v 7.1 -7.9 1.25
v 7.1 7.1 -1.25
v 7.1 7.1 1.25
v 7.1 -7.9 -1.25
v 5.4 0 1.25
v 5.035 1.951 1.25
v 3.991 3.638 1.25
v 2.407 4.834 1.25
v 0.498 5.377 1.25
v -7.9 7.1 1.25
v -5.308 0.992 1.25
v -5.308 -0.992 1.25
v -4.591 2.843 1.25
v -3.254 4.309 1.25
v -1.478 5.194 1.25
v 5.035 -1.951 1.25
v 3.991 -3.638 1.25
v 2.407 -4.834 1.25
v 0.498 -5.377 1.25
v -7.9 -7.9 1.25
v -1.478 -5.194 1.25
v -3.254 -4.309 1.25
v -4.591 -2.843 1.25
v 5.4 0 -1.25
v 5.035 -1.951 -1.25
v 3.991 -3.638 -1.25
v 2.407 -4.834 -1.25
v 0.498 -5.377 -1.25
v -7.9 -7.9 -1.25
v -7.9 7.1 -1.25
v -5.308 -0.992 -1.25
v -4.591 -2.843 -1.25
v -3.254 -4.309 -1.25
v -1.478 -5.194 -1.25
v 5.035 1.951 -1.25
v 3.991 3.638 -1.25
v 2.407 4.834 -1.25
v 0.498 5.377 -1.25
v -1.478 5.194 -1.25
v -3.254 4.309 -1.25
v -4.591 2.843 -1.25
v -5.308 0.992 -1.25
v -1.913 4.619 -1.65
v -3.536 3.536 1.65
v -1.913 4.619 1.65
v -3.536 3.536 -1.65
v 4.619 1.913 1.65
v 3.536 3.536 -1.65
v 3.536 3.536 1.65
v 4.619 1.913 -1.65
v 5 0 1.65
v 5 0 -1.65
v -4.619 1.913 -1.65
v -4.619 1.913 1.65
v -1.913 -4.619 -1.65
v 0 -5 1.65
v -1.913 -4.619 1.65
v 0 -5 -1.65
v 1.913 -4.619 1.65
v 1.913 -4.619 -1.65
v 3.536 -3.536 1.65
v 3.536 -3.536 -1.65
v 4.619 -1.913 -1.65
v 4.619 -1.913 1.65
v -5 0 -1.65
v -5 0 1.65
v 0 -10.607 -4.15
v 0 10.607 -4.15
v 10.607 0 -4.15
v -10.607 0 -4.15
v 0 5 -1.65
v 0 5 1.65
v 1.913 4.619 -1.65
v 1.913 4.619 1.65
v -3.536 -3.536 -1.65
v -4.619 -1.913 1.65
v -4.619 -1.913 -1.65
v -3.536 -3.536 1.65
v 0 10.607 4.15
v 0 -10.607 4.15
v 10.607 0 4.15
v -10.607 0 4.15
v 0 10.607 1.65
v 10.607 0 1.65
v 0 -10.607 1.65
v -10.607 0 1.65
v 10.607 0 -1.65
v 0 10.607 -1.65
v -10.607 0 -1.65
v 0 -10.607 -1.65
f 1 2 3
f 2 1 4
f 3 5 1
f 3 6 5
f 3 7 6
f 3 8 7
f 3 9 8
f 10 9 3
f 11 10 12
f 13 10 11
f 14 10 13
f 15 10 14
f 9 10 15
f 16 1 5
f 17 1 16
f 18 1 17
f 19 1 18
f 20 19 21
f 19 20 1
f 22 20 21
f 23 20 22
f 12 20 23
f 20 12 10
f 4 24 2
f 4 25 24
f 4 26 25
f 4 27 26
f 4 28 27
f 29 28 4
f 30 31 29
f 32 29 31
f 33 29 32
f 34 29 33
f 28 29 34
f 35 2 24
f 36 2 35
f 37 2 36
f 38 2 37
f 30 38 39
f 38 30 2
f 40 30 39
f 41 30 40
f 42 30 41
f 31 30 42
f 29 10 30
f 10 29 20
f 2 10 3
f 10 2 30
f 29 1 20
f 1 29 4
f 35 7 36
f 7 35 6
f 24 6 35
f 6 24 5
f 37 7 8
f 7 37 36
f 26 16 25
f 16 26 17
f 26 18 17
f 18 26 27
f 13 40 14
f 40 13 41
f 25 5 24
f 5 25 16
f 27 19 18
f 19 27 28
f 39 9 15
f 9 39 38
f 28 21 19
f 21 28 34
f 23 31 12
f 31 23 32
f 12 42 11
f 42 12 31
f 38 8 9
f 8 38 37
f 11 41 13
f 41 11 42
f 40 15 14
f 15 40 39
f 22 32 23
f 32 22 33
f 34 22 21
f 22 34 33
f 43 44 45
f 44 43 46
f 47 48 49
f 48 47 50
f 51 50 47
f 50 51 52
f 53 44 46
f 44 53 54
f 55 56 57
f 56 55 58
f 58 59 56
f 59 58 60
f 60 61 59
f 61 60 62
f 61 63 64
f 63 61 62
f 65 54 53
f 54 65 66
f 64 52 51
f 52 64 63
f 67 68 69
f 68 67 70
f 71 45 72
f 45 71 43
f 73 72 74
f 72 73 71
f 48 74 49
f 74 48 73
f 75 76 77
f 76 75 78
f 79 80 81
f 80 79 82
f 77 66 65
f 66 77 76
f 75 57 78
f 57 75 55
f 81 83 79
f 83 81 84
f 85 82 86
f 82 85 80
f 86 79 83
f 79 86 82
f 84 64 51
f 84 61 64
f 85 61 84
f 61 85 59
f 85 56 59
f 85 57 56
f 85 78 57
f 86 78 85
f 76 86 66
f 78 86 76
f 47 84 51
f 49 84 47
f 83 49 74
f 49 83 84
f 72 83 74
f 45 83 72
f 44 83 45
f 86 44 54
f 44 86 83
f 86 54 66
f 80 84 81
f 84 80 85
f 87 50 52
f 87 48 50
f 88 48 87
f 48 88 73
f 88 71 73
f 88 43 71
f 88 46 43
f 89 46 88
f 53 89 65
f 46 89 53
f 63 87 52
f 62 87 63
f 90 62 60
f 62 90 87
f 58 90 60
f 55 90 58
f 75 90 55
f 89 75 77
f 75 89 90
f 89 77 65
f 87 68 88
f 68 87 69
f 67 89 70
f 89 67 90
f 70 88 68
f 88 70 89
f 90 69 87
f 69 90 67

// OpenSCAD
//created by ivanchaos
//this is a test thing for dissolvable material dual-extrusion
//change the "gap" value according to your printer's nozzle diameter for suitable test object. 



cubeEdgeSize = 5;
sectionHeight=2.5;
pivotPillarSize =5;
gap=0.4;	//measured in mm


difference(){
translate([-cubeEdgeSize/2-gap-pivotPillarSize,-cubeEdgeSize/2-gap-pivotPillarSize,-sectionHeight*0.5])cube([cubeEdgeSize+2*pivotPillarSize,cubeEdgeSize+2*pivotPillarSize,sectionHeight]);
cylinder(sectionHeight,pivotPillarSize+gap,pivotPillarSize+gap,true);}
union(){
cylinder(sectionHeight*3+gap*2,pivotPillarSize,pivotPillarSize,true);



rotate([0,0,45])translate([-cubeEdgeSize/2-pivotPillarSize,-cubeEdgeSize/2-pivotPillarSize,sectionHeight*0.5+gap])cube([cubeEdgeSize+2*pivotPillarSize,cubeEdgeSize+2*pivotPillarSize,sectionHeight]);

rotate([0,0,45])translate([-cubeEdgeSize/2-pivotPillarSize,-cubeEdgeSize/2-pivotPillarSize,-sectionHeight*1.5-gap])cube([cubeEdgeSize+2*pivotPillarSize,cubeEdgeSize+2*pivotPillarSize,sectionHeight]);
}
